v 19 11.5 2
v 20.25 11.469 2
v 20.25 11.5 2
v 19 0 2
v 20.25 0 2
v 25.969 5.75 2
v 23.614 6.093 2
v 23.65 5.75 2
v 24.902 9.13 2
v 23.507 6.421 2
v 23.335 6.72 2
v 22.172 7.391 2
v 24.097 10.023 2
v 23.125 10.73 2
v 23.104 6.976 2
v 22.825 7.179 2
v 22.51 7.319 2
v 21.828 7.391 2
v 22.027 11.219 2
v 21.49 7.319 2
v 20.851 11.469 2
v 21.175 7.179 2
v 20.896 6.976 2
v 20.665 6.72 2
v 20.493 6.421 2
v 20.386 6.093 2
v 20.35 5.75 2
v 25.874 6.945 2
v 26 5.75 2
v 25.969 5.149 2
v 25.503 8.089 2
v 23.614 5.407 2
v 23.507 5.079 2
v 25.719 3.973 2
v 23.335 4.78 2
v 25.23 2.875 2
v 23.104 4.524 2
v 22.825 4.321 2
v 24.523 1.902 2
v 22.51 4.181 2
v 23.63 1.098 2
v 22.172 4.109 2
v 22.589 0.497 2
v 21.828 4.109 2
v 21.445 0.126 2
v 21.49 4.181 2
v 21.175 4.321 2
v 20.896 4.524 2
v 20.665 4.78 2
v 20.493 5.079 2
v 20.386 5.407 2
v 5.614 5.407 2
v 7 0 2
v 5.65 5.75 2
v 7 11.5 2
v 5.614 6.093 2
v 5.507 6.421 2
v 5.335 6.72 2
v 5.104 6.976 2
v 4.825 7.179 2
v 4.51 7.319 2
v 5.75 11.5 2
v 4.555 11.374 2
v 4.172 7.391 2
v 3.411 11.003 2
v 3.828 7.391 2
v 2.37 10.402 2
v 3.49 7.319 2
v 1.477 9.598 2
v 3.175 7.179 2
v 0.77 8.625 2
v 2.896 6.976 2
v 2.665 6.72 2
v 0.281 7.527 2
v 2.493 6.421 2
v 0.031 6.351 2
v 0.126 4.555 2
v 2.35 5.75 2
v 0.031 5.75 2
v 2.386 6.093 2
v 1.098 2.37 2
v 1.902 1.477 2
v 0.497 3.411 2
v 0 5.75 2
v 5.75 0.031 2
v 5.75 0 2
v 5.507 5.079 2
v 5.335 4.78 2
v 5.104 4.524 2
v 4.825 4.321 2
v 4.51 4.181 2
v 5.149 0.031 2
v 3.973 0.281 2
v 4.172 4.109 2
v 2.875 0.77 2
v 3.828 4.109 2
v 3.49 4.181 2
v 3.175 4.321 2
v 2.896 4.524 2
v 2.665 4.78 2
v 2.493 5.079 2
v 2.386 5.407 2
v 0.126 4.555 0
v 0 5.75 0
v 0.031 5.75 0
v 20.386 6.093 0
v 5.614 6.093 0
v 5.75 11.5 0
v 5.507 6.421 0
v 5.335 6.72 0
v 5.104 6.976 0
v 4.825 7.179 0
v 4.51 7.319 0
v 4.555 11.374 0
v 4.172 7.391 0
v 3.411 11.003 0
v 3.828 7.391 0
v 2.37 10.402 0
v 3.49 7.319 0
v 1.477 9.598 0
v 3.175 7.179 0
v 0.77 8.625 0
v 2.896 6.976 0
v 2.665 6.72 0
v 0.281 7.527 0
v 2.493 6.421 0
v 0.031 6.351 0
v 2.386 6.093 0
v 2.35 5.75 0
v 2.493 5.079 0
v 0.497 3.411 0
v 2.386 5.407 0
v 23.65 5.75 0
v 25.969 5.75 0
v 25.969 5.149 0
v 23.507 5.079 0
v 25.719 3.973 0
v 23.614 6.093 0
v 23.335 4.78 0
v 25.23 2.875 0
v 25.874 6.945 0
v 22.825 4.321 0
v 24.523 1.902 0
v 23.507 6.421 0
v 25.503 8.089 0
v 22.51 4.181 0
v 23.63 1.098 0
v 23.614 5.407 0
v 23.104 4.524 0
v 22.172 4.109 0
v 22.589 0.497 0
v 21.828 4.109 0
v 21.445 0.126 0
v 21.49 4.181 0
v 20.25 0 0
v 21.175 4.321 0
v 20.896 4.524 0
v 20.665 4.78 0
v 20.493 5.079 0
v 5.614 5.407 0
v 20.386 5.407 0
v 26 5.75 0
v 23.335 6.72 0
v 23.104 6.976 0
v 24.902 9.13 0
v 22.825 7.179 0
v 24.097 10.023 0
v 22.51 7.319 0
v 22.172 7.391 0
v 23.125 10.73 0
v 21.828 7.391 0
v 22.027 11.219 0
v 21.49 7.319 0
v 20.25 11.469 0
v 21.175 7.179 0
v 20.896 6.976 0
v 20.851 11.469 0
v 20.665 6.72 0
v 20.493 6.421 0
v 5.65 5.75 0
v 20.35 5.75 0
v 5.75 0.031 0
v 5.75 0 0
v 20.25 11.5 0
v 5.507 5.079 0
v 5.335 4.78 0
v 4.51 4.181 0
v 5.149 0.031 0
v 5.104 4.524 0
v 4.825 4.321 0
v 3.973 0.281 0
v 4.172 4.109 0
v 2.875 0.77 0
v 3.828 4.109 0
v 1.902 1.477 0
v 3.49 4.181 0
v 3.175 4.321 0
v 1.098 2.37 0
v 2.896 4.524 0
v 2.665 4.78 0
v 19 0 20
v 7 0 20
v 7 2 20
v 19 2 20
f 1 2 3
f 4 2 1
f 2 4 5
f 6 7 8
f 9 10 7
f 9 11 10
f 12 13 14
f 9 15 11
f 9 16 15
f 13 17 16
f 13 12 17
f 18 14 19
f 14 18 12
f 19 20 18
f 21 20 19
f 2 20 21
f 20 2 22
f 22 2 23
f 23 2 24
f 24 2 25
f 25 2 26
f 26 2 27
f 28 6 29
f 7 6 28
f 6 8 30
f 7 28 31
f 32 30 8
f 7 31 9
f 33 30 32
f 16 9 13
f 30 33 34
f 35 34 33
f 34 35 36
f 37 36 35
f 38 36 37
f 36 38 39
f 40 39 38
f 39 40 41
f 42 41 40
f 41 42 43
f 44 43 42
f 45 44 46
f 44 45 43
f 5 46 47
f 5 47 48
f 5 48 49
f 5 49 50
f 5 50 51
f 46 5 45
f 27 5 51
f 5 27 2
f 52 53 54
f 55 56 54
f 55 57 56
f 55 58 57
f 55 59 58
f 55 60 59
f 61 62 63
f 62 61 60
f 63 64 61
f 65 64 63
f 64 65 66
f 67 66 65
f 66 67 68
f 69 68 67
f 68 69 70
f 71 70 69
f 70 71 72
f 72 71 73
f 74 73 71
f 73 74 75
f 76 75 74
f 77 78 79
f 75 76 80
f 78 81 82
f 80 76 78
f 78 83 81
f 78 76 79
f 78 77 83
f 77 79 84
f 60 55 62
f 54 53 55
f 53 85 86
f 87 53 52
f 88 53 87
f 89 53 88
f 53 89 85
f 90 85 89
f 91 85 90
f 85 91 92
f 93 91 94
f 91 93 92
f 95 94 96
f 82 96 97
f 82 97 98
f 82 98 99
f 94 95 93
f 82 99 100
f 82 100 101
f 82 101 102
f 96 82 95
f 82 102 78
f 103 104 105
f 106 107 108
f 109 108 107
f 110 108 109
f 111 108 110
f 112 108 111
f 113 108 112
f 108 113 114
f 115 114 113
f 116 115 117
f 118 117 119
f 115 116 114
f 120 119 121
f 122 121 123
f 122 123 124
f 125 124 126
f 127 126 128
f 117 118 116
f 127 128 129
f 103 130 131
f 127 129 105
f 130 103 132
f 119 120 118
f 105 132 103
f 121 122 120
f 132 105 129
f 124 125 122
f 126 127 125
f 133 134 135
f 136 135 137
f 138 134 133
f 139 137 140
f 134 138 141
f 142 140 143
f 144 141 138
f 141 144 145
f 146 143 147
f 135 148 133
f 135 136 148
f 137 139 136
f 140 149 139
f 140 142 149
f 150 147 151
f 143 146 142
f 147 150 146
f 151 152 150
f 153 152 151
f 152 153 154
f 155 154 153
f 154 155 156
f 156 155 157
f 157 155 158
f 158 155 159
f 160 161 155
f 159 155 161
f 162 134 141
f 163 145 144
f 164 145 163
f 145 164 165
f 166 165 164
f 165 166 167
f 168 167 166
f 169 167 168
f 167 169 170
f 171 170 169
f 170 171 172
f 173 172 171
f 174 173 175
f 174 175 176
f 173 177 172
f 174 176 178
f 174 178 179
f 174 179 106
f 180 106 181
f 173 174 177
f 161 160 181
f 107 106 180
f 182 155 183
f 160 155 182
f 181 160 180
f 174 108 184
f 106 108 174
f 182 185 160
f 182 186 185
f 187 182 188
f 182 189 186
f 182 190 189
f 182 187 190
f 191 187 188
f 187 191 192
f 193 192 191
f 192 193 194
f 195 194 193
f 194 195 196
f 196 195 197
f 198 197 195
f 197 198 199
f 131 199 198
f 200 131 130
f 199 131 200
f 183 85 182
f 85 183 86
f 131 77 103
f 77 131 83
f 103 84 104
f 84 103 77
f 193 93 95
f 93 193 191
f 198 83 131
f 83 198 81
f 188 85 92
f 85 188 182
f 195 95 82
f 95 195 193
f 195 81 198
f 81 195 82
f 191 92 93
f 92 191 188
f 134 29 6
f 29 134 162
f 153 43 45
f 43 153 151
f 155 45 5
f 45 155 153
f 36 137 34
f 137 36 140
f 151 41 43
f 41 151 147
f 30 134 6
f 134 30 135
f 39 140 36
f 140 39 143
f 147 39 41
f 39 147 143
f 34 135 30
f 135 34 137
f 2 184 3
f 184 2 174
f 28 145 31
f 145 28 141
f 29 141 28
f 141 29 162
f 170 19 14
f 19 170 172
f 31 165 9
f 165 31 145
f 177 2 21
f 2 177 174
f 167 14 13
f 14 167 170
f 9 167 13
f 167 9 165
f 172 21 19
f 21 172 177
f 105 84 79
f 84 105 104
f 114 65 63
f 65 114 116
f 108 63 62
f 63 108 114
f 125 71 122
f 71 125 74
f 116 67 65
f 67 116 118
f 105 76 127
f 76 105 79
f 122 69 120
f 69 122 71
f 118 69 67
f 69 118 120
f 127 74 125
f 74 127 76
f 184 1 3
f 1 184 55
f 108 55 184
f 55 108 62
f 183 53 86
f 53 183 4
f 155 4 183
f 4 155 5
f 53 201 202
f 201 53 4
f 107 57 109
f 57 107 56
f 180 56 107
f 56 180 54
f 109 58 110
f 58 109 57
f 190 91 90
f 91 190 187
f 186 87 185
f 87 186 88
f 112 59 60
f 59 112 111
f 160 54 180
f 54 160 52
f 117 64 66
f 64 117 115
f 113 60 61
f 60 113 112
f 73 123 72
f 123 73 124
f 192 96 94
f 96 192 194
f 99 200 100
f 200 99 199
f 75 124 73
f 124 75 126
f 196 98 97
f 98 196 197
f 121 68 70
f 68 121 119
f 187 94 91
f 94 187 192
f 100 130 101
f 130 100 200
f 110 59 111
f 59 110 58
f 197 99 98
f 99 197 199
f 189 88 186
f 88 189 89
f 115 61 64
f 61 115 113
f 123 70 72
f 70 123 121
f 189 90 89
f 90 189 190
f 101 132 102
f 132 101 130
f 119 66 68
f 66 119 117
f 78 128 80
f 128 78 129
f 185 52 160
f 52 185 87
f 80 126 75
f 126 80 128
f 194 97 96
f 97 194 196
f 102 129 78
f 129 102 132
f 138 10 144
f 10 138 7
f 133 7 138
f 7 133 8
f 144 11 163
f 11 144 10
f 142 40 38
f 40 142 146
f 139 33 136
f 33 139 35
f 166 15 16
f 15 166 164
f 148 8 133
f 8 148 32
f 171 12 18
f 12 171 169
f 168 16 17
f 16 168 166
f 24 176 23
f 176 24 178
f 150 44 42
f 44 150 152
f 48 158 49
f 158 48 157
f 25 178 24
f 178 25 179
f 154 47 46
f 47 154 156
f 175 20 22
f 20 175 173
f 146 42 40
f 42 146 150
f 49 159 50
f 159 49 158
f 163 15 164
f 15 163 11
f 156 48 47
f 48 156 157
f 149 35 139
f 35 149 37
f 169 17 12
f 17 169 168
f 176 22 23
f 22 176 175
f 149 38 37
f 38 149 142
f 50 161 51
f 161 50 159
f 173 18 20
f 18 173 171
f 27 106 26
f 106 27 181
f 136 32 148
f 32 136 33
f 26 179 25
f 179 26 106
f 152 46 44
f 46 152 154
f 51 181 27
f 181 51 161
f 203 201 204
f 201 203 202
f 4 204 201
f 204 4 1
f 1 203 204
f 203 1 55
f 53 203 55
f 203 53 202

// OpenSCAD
// file: simple_rounded_cube.scad
module sr_cube(size=[1,1,1],radius=0.5,corners=[1,1,1,1]) {
    difference(){    
    cube(size);
    
        if(corners[0])
        translate([radius,radius,0])rotate([0,0,180])difference(){
                cube([radius*2,radius*2,size[2]]);
                cylinder(size[2],radius,radius);
        }
        if(corners[1])
        translate([size[0]-radius,radius,0])rotate([0,0,270])difference(){
                cube([radius*2,radius*2,size[2]]);
                cylinder(size[2],radius,radius);
        }
        if(corners[2])
        translate([size[0]-radius,size[1]-radius,0])rotate([0,0,0])difference(){
                cube([radius*2,radius*2,size[2]]);
                cylinder(size[2],radius,radius);
        }
        if(corners[3])
        translate([radius,size[1]-radius,0])rotate([0,0,90])difference(){
                cube([radius*2,radius*2,size[2]]);
                cylinder(size[2],radius,radius);
        }
        }
        
}


//sr_cube([20,20,5], radius=4,corners=[0,0,0,0]);
// main file
$fn = 30;

eps = 0.3;


h = 20;
w = 11.5;
lt = 12; //length top
l = 26;
hole_dist = 18;
hr = (3+eps)/2;
s = 2;

include<simple_rounded_cube.scad>

difference() {
sr_cube([l,w,2], radius=w/2);
translate([l/2 - hole_dist/2,w/2,0]) cylinder(s,hr,hr);
translate([l/2 + hole_dist/2,w/2,0]) cylinder(s,hr,hr);
}

translate([l/2 - lt/2,0,0]) rotate([90,0,90]) linear_extrude(lt) polygon([[0,0],[w,0],[w,s],[s,h],[0,h]]);
